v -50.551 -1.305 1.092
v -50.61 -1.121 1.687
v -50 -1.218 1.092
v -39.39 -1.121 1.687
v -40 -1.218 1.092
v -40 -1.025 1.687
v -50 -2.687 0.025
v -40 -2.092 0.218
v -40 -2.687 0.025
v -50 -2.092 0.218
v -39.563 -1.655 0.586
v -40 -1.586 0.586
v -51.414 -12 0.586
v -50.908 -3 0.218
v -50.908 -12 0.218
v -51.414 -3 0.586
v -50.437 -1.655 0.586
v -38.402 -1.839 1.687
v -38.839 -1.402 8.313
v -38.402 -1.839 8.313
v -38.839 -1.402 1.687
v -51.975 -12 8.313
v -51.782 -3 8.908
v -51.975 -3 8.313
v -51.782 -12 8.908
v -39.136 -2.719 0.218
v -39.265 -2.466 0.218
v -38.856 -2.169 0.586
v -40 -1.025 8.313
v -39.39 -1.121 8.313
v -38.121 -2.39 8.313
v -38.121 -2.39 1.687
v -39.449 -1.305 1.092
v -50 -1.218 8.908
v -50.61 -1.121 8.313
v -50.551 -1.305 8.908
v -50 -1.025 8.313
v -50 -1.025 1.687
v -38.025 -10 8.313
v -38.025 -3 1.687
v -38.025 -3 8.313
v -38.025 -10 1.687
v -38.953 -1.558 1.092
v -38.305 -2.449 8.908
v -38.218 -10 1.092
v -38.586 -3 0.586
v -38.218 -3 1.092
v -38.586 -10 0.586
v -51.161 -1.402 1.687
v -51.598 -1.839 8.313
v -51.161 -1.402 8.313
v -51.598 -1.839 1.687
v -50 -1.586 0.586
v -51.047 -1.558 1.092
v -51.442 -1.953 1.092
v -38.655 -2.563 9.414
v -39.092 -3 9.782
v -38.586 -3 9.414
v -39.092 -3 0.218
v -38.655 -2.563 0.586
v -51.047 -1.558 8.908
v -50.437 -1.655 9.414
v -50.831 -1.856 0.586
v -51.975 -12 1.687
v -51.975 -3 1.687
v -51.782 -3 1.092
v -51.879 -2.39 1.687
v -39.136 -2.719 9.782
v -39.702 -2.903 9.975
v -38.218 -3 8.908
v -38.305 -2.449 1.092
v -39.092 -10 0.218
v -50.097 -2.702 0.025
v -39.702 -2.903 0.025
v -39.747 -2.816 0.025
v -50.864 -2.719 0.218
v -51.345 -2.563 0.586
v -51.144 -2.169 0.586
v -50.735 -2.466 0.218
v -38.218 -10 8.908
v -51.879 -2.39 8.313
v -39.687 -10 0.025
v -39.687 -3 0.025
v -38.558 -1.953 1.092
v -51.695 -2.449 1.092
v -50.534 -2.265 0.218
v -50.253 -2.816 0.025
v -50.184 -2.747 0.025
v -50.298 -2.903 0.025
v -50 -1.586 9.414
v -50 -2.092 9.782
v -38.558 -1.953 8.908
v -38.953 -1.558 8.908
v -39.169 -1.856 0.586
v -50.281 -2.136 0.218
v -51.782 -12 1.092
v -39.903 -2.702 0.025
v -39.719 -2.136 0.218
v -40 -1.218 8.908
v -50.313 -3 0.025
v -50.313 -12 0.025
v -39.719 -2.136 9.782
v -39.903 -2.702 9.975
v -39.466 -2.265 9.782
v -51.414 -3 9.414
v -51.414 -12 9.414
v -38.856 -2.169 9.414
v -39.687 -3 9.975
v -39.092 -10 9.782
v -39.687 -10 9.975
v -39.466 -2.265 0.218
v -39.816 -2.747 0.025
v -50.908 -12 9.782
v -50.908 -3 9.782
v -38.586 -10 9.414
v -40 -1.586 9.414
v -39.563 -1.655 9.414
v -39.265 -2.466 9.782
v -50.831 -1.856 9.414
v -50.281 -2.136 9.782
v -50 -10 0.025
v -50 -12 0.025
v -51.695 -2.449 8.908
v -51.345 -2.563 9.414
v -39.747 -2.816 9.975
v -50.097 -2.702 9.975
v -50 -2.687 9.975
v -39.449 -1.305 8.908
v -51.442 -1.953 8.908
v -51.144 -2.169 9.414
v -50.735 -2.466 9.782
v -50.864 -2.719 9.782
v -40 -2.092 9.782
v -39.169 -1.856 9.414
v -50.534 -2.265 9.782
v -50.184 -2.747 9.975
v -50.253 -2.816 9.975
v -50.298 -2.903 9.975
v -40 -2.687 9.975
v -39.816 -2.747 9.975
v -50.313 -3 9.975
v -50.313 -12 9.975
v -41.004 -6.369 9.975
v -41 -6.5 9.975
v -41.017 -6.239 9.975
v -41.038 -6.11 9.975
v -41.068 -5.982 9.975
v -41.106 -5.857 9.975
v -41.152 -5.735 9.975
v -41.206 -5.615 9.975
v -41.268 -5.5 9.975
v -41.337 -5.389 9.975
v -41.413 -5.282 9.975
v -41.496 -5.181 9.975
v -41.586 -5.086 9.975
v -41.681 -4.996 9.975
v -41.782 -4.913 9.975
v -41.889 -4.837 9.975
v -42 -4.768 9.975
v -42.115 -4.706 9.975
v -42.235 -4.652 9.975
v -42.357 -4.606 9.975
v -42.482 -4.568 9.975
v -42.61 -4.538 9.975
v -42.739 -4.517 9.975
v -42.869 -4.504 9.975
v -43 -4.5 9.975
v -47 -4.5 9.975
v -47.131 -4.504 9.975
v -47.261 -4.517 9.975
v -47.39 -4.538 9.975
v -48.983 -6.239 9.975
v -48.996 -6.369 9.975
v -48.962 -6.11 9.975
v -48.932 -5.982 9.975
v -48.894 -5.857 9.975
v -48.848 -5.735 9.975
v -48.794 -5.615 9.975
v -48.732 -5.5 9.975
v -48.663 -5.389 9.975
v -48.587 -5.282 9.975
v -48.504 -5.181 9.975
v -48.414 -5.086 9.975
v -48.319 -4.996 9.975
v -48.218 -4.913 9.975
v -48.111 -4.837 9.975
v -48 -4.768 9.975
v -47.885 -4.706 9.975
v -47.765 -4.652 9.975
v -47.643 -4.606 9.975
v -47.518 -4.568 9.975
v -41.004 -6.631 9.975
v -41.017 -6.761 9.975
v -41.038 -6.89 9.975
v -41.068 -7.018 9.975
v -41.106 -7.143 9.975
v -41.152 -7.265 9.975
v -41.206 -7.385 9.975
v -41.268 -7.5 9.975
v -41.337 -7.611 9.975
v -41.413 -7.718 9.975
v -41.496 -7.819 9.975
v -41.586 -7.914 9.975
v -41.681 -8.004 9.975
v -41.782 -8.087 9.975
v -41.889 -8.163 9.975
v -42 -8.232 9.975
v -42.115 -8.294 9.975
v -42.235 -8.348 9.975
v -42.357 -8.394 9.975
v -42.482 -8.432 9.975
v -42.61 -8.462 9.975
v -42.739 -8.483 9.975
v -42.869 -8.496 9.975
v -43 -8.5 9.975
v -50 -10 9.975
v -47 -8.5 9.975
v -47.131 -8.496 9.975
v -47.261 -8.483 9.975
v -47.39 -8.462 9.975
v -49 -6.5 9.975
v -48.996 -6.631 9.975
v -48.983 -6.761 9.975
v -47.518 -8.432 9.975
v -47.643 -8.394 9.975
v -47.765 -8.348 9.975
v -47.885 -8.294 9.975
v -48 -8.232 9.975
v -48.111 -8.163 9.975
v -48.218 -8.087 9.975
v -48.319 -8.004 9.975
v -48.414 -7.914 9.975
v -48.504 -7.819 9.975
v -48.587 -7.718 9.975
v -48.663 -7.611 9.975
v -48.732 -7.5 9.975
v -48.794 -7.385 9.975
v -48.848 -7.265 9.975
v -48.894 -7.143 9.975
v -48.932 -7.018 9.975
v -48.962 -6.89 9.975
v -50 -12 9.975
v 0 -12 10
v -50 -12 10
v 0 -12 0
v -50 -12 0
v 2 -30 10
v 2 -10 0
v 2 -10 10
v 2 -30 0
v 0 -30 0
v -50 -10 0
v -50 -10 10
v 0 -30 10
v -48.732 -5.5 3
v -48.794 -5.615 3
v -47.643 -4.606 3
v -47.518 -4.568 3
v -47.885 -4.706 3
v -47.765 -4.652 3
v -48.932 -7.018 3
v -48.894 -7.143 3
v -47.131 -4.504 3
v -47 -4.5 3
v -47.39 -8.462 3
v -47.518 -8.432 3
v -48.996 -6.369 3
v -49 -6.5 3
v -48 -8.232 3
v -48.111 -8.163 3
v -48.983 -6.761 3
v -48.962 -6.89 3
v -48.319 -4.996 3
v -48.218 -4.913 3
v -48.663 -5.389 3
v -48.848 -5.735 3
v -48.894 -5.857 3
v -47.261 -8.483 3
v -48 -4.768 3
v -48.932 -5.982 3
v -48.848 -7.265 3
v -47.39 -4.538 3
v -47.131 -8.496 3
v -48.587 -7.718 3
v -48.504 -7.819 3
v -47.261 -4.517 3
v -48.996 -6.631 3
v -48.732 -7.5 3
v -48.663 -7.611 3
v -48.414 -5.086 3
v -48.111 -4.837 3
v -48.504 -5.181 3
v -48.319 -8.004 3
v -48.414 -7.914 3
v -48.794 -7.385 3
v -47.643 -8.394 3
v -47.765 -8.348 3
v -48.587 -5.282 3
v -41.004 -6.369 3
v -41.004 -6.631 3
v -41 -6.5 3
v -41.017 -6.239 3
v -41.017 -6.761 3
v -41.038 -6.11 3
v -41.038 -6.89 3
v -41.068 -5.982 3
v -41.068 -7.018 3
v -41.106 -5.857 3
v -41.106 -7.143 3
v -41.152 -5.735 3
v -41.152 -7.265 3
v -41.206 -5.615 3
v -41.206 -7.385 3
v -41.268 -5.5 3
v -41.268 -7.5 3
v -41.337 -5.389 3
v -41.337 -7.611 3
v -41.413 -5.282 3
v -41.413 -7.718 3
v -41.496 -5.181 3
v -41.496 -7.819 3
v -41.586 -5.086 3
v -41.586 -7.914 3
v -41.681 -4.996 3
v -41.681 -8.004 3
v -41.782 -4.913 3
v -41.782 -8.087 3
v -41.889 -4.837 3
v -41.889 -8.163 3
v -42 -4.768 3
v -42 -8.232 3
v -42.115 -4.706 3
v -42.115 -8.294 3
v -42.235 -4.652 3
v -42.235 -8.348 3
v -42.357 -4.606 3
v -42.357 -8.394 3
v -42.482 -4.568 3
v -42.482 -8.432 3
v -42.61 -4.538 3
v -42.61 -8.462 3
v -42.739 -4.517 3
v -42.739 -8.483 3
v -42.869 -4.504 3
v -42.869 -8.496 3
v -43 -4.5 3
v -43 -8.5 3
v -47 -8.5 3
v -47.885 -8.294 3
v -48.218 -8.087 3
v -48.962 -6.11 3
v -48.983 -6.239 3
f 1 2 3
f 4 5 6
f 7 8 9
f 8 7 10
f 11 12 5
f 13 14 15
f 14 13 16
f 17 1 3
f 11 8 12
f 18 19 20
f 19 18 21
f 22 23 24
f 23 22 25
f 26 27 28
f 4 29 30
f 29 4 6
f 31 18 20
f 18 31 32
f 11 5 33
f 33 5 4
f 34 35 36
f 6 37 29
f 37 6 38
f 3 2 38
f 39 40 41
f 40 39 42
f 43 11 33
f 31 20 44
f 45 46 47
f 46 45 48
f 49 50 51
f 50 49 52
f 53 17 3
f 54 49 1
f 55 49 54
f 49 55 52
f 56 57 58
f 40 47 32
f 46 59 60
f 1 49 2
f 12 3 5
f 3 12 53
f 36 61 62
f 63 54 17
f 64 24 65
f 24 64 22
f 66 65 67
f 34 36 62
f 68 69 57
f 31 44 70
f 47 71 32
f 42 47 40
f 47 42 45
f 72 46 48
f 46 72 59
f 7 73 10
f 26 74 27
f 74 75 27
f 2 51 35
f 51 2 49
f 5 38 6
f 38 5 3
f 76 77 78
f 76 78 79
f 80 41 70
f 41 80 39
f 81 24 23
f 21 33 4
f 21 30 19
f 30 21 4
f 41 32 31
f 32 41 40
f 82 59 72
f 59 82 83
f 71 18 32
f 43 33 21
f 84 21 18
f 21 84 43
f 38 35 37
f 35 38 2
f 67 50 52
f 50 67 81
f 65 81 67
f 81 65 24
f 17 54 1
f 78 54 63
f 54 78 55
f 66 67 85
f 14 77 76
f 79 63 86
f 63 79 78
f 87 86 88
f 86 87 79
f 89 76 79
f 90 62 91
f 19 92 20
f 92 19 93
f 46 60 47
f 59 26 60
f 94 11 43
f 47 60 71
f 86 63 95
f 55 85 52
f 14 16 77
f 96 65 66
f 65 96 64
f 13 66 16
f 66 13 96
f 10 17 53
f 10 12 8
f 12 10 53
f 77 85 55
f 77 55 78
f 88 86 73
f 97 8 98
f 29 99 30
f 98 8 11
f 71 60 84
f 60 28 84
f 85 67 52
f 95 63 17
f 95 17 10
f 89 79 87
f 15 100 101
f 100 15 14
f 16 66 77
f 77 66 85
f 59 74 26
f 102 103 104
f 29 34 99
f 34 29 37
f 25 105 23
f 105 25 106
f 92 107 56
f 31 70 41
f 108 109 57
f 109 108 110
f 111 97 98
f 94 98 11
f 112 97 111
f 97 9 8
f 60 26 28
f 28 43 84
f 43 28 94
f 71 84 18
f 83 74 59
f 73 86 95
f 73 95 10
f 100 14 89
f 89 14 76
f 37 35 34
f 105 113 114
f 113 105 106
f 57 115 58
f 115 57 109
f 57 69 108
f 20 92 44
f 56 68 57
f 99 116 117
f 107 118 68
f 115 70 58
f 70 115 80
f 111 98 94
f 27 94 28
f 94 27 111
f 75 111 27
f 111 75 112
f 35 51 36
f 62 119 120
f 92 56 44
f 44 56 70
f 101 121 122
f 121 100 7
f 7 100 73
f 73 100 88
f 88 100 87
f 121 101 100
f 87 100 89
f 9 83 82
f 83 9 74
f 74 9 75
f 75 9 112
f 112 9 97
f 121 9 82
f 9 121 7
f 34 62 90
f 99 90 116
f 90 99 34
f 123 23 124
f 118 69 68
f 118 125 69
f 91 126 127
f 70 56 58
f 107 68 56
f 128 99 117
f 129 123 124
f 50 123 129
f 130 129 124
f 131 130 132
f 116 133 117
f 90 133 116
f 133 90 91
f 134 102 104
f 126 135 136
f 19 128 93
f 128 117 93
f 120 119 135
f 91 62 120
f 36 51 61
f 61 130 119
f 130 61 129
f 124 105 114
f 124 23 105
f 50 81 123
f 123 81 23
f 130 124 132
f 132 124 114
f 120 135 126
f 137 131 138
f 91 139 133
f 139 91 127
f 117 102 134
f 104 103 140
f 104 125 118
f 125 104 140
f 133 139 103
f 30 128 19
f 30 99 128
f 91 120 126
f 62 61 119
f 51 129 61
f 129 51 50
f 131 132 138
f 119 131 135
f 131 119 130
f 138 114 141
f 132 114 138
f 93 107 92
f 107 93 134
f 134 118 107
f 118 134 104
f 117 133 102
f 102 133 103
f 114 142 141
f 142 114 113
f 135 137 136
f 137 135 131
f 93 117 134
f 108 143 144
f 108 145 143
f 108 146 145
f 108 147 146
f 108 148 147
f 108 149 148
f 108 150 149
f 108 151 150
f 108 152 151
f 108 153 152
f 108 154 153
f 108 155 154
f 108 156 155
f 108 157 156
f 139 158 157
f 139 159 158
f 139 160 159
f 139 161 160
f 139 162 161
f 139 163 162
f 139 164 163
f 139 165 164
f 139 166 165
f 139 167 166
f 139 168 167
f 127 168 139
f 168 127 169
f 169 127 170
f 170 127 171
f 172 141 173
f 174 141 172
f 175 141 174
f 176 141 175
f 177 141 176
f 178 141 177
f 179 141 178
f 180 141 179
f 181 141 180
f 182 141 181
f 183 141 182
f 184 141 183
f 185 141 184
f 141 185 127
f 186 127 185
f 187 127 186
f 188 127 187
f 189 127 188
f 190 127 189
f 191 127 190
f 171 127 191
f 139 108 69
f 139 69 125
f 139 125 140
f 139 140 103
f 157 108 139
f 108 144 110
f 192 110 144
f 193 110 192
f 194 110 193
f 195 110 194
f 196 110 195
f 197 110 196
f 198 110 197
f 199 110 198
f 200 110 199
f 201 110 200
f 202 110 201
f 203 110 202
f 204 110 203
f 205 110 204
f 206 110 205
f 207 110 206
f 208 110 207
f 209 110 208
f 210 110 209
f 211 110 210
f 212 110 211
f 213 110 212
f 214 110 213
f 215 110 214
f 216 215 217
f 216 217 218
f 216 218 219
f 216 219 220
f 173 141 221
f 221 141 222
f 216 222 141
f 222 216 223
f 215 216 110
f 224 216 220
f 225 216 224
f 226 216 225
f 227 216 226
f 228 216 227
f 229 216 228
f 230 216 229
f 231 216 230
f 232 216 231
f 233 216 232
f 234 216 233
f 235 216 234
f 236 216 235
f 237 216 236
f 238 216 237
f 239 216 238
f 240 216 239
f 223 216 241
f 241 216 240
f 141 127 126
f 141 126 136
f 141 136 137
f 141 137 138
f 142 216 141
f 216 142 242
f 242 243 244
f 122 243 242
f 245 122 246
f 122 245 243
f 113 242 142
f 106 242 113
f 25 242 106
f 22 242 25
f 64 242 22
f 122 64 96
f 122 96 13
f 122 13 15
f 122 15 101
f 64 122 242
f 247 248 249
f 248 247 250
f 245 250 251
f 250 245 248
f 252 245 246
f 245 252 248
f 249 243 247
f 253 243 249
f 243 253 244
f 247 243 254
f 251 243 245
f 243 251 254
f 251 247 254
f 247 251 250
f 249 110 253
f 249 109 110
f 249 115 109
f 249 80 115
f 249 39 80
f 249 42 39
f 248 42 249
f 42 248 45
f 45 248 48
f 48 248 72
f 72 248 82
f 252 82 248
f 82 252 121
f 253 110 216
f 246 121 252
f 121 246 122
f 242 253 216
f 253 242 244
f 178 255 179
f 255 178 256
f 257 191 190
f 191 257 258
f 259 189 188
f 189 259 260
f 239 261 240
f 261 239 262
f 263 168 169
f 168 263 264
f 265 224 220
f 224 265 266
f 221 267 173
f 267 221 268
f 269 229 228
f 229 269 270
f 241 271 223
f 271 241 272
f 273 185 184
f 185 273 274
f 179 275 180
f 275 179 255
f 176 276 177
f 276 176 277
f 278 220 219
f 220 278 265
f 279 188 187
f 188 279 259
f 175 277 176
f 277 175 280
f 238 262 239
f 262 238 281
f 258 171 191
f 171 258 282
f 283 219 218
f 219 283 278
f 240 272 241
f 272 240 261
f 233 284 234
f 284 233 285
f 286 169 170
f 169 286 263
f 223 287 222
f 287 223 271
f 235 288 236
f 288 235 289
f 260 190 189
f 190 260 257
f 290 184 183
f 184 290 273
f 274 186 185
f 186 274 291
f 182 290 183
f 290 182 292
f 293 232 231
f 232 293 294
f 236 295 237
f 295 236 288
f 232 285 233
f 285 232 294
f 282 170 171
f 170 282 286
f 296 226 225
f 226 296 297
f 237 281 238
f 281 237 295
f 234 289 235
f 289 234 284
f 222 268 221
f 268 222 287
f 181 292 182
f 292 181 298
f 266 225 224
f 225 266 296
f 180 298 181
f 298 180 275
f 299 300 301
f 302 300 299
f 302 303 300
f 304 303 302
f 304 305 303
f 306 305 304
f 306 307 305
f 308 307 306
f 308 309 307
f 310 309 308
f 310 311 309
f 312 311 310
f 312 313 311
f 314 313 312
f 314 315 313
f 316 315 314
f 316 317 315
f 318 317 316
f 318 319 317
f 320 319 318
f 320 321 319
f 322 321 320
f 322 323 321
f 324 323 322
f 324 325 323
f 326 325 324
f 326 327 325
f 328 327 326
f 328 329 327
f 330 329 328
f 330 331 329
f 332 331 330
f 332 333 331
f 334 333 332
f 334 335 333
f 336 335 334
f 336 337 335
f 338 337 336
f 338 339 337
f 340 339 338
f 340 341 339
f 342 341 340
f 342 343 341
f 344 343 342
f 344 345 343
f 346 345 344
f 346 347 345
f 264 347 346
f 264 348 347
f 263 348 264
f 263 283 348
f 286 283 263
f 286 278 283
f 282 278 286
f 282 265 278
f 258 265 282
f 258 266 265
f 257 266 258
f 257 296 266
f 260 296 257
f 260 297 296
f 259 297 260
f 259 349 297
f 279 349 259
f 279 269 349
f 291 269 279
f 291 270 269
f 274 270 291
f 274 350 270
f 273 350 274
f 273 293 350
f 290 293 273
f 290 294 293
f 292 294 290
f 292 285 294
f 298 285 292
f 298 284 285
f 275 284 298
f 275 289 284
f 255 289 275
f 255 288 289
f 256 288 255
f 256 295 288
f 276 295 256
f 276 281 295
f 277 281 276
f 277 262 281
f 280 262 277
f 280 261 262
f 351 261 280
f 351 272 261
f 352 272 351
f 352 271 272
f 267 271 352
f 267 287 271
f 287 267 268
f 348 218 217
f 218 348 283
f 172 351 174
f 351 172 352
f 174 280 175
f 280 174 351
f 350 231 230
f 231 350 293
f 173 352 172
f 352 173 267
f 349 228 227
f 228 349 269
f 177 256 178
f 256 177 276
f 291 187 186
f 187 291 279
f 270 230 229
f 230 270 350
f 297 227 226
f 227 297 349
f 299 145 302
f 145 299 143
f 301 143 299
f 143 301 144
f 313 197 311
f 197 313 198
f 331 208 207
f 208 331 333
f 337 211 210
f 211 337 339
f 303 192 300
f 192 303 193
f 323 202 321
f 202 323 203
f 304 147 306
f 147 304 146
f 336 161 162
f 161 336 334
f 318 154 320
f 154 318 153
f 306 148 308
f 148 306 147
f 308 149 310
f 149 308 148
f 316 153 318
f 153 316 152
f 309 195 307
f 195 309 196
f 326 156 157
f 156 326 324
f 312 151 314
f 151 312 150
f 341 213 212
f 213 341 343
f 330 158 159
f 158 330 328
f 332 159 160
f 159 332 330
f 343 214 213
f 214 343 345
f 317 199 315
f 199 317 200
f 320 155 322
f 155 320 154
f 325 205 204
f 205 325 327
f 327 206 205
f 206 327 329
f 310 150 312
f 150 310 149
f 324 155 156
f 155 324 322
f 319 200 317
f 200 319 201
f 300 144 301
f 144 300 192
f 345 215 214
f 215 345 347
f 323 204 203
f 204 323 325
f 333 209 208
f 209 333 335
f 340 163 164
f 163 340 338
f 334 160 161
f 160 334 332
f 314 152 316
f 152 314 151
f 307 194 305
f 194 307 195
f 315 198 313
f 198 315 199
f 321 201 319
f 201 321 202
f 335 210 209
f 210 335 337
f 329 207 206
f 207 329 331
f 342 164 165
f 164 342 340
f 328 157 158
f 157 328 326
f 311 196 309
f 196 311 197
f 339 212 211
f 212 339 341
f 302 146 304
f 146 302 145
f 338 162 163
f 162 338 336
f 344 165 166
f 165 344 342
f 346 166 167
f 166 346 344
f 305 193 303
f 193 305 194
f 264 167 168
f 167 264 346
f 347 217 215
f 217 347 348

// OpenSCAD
module inner_rideau(rayon, longueur){
	translate([0,rayon,0]) color("orange") cylinder(r=rayon, h=10, $fn=96);
	translate([longueur-(2*rayon),rayon,0]) color("orange") cylinder(r=rayon, h=10, $fn=96);
	color("orange") cube([longueur-(2*rayon),2*rayon,10]);
}

module inner_rideau_small(){
	rayon = 2;
	longueur = 8;
	inner_rideau(rayon, longueur);
}

module inner_rideau_big(){
	rayon = 3;
	longueur = 10;
	inner_rideau(rayon, longueur);
}

module crochet(){
	epaisseur = 2;
	color("blue") cube([epaisseur,20,10]);
	color("red") rotate([0,0,90]) cube([epaisseur,50,10]);
	translate([-50,-7,2]) difference(){	
		minkowski ()
   	{
			cube([10,9,6]);
			sphere (2, $fn=20);
   	}
		translate([-2,9,-2]) cube([14,2,10]);
	}
}

module crochet_big(){
	translate([0,10,0]) 
	difference(){
		crochet();
		translate([-47,-7,3]) inner_rideau_big();
	}
}

module crochet_small(){
	translate([0,-10,10]) 
	difference(){
		rotate([180,0,0]) crochet();
		translate([-47,1.5,-7]) inner_rideau_small();
	}
}

crochet_small();
//crochet_big();
